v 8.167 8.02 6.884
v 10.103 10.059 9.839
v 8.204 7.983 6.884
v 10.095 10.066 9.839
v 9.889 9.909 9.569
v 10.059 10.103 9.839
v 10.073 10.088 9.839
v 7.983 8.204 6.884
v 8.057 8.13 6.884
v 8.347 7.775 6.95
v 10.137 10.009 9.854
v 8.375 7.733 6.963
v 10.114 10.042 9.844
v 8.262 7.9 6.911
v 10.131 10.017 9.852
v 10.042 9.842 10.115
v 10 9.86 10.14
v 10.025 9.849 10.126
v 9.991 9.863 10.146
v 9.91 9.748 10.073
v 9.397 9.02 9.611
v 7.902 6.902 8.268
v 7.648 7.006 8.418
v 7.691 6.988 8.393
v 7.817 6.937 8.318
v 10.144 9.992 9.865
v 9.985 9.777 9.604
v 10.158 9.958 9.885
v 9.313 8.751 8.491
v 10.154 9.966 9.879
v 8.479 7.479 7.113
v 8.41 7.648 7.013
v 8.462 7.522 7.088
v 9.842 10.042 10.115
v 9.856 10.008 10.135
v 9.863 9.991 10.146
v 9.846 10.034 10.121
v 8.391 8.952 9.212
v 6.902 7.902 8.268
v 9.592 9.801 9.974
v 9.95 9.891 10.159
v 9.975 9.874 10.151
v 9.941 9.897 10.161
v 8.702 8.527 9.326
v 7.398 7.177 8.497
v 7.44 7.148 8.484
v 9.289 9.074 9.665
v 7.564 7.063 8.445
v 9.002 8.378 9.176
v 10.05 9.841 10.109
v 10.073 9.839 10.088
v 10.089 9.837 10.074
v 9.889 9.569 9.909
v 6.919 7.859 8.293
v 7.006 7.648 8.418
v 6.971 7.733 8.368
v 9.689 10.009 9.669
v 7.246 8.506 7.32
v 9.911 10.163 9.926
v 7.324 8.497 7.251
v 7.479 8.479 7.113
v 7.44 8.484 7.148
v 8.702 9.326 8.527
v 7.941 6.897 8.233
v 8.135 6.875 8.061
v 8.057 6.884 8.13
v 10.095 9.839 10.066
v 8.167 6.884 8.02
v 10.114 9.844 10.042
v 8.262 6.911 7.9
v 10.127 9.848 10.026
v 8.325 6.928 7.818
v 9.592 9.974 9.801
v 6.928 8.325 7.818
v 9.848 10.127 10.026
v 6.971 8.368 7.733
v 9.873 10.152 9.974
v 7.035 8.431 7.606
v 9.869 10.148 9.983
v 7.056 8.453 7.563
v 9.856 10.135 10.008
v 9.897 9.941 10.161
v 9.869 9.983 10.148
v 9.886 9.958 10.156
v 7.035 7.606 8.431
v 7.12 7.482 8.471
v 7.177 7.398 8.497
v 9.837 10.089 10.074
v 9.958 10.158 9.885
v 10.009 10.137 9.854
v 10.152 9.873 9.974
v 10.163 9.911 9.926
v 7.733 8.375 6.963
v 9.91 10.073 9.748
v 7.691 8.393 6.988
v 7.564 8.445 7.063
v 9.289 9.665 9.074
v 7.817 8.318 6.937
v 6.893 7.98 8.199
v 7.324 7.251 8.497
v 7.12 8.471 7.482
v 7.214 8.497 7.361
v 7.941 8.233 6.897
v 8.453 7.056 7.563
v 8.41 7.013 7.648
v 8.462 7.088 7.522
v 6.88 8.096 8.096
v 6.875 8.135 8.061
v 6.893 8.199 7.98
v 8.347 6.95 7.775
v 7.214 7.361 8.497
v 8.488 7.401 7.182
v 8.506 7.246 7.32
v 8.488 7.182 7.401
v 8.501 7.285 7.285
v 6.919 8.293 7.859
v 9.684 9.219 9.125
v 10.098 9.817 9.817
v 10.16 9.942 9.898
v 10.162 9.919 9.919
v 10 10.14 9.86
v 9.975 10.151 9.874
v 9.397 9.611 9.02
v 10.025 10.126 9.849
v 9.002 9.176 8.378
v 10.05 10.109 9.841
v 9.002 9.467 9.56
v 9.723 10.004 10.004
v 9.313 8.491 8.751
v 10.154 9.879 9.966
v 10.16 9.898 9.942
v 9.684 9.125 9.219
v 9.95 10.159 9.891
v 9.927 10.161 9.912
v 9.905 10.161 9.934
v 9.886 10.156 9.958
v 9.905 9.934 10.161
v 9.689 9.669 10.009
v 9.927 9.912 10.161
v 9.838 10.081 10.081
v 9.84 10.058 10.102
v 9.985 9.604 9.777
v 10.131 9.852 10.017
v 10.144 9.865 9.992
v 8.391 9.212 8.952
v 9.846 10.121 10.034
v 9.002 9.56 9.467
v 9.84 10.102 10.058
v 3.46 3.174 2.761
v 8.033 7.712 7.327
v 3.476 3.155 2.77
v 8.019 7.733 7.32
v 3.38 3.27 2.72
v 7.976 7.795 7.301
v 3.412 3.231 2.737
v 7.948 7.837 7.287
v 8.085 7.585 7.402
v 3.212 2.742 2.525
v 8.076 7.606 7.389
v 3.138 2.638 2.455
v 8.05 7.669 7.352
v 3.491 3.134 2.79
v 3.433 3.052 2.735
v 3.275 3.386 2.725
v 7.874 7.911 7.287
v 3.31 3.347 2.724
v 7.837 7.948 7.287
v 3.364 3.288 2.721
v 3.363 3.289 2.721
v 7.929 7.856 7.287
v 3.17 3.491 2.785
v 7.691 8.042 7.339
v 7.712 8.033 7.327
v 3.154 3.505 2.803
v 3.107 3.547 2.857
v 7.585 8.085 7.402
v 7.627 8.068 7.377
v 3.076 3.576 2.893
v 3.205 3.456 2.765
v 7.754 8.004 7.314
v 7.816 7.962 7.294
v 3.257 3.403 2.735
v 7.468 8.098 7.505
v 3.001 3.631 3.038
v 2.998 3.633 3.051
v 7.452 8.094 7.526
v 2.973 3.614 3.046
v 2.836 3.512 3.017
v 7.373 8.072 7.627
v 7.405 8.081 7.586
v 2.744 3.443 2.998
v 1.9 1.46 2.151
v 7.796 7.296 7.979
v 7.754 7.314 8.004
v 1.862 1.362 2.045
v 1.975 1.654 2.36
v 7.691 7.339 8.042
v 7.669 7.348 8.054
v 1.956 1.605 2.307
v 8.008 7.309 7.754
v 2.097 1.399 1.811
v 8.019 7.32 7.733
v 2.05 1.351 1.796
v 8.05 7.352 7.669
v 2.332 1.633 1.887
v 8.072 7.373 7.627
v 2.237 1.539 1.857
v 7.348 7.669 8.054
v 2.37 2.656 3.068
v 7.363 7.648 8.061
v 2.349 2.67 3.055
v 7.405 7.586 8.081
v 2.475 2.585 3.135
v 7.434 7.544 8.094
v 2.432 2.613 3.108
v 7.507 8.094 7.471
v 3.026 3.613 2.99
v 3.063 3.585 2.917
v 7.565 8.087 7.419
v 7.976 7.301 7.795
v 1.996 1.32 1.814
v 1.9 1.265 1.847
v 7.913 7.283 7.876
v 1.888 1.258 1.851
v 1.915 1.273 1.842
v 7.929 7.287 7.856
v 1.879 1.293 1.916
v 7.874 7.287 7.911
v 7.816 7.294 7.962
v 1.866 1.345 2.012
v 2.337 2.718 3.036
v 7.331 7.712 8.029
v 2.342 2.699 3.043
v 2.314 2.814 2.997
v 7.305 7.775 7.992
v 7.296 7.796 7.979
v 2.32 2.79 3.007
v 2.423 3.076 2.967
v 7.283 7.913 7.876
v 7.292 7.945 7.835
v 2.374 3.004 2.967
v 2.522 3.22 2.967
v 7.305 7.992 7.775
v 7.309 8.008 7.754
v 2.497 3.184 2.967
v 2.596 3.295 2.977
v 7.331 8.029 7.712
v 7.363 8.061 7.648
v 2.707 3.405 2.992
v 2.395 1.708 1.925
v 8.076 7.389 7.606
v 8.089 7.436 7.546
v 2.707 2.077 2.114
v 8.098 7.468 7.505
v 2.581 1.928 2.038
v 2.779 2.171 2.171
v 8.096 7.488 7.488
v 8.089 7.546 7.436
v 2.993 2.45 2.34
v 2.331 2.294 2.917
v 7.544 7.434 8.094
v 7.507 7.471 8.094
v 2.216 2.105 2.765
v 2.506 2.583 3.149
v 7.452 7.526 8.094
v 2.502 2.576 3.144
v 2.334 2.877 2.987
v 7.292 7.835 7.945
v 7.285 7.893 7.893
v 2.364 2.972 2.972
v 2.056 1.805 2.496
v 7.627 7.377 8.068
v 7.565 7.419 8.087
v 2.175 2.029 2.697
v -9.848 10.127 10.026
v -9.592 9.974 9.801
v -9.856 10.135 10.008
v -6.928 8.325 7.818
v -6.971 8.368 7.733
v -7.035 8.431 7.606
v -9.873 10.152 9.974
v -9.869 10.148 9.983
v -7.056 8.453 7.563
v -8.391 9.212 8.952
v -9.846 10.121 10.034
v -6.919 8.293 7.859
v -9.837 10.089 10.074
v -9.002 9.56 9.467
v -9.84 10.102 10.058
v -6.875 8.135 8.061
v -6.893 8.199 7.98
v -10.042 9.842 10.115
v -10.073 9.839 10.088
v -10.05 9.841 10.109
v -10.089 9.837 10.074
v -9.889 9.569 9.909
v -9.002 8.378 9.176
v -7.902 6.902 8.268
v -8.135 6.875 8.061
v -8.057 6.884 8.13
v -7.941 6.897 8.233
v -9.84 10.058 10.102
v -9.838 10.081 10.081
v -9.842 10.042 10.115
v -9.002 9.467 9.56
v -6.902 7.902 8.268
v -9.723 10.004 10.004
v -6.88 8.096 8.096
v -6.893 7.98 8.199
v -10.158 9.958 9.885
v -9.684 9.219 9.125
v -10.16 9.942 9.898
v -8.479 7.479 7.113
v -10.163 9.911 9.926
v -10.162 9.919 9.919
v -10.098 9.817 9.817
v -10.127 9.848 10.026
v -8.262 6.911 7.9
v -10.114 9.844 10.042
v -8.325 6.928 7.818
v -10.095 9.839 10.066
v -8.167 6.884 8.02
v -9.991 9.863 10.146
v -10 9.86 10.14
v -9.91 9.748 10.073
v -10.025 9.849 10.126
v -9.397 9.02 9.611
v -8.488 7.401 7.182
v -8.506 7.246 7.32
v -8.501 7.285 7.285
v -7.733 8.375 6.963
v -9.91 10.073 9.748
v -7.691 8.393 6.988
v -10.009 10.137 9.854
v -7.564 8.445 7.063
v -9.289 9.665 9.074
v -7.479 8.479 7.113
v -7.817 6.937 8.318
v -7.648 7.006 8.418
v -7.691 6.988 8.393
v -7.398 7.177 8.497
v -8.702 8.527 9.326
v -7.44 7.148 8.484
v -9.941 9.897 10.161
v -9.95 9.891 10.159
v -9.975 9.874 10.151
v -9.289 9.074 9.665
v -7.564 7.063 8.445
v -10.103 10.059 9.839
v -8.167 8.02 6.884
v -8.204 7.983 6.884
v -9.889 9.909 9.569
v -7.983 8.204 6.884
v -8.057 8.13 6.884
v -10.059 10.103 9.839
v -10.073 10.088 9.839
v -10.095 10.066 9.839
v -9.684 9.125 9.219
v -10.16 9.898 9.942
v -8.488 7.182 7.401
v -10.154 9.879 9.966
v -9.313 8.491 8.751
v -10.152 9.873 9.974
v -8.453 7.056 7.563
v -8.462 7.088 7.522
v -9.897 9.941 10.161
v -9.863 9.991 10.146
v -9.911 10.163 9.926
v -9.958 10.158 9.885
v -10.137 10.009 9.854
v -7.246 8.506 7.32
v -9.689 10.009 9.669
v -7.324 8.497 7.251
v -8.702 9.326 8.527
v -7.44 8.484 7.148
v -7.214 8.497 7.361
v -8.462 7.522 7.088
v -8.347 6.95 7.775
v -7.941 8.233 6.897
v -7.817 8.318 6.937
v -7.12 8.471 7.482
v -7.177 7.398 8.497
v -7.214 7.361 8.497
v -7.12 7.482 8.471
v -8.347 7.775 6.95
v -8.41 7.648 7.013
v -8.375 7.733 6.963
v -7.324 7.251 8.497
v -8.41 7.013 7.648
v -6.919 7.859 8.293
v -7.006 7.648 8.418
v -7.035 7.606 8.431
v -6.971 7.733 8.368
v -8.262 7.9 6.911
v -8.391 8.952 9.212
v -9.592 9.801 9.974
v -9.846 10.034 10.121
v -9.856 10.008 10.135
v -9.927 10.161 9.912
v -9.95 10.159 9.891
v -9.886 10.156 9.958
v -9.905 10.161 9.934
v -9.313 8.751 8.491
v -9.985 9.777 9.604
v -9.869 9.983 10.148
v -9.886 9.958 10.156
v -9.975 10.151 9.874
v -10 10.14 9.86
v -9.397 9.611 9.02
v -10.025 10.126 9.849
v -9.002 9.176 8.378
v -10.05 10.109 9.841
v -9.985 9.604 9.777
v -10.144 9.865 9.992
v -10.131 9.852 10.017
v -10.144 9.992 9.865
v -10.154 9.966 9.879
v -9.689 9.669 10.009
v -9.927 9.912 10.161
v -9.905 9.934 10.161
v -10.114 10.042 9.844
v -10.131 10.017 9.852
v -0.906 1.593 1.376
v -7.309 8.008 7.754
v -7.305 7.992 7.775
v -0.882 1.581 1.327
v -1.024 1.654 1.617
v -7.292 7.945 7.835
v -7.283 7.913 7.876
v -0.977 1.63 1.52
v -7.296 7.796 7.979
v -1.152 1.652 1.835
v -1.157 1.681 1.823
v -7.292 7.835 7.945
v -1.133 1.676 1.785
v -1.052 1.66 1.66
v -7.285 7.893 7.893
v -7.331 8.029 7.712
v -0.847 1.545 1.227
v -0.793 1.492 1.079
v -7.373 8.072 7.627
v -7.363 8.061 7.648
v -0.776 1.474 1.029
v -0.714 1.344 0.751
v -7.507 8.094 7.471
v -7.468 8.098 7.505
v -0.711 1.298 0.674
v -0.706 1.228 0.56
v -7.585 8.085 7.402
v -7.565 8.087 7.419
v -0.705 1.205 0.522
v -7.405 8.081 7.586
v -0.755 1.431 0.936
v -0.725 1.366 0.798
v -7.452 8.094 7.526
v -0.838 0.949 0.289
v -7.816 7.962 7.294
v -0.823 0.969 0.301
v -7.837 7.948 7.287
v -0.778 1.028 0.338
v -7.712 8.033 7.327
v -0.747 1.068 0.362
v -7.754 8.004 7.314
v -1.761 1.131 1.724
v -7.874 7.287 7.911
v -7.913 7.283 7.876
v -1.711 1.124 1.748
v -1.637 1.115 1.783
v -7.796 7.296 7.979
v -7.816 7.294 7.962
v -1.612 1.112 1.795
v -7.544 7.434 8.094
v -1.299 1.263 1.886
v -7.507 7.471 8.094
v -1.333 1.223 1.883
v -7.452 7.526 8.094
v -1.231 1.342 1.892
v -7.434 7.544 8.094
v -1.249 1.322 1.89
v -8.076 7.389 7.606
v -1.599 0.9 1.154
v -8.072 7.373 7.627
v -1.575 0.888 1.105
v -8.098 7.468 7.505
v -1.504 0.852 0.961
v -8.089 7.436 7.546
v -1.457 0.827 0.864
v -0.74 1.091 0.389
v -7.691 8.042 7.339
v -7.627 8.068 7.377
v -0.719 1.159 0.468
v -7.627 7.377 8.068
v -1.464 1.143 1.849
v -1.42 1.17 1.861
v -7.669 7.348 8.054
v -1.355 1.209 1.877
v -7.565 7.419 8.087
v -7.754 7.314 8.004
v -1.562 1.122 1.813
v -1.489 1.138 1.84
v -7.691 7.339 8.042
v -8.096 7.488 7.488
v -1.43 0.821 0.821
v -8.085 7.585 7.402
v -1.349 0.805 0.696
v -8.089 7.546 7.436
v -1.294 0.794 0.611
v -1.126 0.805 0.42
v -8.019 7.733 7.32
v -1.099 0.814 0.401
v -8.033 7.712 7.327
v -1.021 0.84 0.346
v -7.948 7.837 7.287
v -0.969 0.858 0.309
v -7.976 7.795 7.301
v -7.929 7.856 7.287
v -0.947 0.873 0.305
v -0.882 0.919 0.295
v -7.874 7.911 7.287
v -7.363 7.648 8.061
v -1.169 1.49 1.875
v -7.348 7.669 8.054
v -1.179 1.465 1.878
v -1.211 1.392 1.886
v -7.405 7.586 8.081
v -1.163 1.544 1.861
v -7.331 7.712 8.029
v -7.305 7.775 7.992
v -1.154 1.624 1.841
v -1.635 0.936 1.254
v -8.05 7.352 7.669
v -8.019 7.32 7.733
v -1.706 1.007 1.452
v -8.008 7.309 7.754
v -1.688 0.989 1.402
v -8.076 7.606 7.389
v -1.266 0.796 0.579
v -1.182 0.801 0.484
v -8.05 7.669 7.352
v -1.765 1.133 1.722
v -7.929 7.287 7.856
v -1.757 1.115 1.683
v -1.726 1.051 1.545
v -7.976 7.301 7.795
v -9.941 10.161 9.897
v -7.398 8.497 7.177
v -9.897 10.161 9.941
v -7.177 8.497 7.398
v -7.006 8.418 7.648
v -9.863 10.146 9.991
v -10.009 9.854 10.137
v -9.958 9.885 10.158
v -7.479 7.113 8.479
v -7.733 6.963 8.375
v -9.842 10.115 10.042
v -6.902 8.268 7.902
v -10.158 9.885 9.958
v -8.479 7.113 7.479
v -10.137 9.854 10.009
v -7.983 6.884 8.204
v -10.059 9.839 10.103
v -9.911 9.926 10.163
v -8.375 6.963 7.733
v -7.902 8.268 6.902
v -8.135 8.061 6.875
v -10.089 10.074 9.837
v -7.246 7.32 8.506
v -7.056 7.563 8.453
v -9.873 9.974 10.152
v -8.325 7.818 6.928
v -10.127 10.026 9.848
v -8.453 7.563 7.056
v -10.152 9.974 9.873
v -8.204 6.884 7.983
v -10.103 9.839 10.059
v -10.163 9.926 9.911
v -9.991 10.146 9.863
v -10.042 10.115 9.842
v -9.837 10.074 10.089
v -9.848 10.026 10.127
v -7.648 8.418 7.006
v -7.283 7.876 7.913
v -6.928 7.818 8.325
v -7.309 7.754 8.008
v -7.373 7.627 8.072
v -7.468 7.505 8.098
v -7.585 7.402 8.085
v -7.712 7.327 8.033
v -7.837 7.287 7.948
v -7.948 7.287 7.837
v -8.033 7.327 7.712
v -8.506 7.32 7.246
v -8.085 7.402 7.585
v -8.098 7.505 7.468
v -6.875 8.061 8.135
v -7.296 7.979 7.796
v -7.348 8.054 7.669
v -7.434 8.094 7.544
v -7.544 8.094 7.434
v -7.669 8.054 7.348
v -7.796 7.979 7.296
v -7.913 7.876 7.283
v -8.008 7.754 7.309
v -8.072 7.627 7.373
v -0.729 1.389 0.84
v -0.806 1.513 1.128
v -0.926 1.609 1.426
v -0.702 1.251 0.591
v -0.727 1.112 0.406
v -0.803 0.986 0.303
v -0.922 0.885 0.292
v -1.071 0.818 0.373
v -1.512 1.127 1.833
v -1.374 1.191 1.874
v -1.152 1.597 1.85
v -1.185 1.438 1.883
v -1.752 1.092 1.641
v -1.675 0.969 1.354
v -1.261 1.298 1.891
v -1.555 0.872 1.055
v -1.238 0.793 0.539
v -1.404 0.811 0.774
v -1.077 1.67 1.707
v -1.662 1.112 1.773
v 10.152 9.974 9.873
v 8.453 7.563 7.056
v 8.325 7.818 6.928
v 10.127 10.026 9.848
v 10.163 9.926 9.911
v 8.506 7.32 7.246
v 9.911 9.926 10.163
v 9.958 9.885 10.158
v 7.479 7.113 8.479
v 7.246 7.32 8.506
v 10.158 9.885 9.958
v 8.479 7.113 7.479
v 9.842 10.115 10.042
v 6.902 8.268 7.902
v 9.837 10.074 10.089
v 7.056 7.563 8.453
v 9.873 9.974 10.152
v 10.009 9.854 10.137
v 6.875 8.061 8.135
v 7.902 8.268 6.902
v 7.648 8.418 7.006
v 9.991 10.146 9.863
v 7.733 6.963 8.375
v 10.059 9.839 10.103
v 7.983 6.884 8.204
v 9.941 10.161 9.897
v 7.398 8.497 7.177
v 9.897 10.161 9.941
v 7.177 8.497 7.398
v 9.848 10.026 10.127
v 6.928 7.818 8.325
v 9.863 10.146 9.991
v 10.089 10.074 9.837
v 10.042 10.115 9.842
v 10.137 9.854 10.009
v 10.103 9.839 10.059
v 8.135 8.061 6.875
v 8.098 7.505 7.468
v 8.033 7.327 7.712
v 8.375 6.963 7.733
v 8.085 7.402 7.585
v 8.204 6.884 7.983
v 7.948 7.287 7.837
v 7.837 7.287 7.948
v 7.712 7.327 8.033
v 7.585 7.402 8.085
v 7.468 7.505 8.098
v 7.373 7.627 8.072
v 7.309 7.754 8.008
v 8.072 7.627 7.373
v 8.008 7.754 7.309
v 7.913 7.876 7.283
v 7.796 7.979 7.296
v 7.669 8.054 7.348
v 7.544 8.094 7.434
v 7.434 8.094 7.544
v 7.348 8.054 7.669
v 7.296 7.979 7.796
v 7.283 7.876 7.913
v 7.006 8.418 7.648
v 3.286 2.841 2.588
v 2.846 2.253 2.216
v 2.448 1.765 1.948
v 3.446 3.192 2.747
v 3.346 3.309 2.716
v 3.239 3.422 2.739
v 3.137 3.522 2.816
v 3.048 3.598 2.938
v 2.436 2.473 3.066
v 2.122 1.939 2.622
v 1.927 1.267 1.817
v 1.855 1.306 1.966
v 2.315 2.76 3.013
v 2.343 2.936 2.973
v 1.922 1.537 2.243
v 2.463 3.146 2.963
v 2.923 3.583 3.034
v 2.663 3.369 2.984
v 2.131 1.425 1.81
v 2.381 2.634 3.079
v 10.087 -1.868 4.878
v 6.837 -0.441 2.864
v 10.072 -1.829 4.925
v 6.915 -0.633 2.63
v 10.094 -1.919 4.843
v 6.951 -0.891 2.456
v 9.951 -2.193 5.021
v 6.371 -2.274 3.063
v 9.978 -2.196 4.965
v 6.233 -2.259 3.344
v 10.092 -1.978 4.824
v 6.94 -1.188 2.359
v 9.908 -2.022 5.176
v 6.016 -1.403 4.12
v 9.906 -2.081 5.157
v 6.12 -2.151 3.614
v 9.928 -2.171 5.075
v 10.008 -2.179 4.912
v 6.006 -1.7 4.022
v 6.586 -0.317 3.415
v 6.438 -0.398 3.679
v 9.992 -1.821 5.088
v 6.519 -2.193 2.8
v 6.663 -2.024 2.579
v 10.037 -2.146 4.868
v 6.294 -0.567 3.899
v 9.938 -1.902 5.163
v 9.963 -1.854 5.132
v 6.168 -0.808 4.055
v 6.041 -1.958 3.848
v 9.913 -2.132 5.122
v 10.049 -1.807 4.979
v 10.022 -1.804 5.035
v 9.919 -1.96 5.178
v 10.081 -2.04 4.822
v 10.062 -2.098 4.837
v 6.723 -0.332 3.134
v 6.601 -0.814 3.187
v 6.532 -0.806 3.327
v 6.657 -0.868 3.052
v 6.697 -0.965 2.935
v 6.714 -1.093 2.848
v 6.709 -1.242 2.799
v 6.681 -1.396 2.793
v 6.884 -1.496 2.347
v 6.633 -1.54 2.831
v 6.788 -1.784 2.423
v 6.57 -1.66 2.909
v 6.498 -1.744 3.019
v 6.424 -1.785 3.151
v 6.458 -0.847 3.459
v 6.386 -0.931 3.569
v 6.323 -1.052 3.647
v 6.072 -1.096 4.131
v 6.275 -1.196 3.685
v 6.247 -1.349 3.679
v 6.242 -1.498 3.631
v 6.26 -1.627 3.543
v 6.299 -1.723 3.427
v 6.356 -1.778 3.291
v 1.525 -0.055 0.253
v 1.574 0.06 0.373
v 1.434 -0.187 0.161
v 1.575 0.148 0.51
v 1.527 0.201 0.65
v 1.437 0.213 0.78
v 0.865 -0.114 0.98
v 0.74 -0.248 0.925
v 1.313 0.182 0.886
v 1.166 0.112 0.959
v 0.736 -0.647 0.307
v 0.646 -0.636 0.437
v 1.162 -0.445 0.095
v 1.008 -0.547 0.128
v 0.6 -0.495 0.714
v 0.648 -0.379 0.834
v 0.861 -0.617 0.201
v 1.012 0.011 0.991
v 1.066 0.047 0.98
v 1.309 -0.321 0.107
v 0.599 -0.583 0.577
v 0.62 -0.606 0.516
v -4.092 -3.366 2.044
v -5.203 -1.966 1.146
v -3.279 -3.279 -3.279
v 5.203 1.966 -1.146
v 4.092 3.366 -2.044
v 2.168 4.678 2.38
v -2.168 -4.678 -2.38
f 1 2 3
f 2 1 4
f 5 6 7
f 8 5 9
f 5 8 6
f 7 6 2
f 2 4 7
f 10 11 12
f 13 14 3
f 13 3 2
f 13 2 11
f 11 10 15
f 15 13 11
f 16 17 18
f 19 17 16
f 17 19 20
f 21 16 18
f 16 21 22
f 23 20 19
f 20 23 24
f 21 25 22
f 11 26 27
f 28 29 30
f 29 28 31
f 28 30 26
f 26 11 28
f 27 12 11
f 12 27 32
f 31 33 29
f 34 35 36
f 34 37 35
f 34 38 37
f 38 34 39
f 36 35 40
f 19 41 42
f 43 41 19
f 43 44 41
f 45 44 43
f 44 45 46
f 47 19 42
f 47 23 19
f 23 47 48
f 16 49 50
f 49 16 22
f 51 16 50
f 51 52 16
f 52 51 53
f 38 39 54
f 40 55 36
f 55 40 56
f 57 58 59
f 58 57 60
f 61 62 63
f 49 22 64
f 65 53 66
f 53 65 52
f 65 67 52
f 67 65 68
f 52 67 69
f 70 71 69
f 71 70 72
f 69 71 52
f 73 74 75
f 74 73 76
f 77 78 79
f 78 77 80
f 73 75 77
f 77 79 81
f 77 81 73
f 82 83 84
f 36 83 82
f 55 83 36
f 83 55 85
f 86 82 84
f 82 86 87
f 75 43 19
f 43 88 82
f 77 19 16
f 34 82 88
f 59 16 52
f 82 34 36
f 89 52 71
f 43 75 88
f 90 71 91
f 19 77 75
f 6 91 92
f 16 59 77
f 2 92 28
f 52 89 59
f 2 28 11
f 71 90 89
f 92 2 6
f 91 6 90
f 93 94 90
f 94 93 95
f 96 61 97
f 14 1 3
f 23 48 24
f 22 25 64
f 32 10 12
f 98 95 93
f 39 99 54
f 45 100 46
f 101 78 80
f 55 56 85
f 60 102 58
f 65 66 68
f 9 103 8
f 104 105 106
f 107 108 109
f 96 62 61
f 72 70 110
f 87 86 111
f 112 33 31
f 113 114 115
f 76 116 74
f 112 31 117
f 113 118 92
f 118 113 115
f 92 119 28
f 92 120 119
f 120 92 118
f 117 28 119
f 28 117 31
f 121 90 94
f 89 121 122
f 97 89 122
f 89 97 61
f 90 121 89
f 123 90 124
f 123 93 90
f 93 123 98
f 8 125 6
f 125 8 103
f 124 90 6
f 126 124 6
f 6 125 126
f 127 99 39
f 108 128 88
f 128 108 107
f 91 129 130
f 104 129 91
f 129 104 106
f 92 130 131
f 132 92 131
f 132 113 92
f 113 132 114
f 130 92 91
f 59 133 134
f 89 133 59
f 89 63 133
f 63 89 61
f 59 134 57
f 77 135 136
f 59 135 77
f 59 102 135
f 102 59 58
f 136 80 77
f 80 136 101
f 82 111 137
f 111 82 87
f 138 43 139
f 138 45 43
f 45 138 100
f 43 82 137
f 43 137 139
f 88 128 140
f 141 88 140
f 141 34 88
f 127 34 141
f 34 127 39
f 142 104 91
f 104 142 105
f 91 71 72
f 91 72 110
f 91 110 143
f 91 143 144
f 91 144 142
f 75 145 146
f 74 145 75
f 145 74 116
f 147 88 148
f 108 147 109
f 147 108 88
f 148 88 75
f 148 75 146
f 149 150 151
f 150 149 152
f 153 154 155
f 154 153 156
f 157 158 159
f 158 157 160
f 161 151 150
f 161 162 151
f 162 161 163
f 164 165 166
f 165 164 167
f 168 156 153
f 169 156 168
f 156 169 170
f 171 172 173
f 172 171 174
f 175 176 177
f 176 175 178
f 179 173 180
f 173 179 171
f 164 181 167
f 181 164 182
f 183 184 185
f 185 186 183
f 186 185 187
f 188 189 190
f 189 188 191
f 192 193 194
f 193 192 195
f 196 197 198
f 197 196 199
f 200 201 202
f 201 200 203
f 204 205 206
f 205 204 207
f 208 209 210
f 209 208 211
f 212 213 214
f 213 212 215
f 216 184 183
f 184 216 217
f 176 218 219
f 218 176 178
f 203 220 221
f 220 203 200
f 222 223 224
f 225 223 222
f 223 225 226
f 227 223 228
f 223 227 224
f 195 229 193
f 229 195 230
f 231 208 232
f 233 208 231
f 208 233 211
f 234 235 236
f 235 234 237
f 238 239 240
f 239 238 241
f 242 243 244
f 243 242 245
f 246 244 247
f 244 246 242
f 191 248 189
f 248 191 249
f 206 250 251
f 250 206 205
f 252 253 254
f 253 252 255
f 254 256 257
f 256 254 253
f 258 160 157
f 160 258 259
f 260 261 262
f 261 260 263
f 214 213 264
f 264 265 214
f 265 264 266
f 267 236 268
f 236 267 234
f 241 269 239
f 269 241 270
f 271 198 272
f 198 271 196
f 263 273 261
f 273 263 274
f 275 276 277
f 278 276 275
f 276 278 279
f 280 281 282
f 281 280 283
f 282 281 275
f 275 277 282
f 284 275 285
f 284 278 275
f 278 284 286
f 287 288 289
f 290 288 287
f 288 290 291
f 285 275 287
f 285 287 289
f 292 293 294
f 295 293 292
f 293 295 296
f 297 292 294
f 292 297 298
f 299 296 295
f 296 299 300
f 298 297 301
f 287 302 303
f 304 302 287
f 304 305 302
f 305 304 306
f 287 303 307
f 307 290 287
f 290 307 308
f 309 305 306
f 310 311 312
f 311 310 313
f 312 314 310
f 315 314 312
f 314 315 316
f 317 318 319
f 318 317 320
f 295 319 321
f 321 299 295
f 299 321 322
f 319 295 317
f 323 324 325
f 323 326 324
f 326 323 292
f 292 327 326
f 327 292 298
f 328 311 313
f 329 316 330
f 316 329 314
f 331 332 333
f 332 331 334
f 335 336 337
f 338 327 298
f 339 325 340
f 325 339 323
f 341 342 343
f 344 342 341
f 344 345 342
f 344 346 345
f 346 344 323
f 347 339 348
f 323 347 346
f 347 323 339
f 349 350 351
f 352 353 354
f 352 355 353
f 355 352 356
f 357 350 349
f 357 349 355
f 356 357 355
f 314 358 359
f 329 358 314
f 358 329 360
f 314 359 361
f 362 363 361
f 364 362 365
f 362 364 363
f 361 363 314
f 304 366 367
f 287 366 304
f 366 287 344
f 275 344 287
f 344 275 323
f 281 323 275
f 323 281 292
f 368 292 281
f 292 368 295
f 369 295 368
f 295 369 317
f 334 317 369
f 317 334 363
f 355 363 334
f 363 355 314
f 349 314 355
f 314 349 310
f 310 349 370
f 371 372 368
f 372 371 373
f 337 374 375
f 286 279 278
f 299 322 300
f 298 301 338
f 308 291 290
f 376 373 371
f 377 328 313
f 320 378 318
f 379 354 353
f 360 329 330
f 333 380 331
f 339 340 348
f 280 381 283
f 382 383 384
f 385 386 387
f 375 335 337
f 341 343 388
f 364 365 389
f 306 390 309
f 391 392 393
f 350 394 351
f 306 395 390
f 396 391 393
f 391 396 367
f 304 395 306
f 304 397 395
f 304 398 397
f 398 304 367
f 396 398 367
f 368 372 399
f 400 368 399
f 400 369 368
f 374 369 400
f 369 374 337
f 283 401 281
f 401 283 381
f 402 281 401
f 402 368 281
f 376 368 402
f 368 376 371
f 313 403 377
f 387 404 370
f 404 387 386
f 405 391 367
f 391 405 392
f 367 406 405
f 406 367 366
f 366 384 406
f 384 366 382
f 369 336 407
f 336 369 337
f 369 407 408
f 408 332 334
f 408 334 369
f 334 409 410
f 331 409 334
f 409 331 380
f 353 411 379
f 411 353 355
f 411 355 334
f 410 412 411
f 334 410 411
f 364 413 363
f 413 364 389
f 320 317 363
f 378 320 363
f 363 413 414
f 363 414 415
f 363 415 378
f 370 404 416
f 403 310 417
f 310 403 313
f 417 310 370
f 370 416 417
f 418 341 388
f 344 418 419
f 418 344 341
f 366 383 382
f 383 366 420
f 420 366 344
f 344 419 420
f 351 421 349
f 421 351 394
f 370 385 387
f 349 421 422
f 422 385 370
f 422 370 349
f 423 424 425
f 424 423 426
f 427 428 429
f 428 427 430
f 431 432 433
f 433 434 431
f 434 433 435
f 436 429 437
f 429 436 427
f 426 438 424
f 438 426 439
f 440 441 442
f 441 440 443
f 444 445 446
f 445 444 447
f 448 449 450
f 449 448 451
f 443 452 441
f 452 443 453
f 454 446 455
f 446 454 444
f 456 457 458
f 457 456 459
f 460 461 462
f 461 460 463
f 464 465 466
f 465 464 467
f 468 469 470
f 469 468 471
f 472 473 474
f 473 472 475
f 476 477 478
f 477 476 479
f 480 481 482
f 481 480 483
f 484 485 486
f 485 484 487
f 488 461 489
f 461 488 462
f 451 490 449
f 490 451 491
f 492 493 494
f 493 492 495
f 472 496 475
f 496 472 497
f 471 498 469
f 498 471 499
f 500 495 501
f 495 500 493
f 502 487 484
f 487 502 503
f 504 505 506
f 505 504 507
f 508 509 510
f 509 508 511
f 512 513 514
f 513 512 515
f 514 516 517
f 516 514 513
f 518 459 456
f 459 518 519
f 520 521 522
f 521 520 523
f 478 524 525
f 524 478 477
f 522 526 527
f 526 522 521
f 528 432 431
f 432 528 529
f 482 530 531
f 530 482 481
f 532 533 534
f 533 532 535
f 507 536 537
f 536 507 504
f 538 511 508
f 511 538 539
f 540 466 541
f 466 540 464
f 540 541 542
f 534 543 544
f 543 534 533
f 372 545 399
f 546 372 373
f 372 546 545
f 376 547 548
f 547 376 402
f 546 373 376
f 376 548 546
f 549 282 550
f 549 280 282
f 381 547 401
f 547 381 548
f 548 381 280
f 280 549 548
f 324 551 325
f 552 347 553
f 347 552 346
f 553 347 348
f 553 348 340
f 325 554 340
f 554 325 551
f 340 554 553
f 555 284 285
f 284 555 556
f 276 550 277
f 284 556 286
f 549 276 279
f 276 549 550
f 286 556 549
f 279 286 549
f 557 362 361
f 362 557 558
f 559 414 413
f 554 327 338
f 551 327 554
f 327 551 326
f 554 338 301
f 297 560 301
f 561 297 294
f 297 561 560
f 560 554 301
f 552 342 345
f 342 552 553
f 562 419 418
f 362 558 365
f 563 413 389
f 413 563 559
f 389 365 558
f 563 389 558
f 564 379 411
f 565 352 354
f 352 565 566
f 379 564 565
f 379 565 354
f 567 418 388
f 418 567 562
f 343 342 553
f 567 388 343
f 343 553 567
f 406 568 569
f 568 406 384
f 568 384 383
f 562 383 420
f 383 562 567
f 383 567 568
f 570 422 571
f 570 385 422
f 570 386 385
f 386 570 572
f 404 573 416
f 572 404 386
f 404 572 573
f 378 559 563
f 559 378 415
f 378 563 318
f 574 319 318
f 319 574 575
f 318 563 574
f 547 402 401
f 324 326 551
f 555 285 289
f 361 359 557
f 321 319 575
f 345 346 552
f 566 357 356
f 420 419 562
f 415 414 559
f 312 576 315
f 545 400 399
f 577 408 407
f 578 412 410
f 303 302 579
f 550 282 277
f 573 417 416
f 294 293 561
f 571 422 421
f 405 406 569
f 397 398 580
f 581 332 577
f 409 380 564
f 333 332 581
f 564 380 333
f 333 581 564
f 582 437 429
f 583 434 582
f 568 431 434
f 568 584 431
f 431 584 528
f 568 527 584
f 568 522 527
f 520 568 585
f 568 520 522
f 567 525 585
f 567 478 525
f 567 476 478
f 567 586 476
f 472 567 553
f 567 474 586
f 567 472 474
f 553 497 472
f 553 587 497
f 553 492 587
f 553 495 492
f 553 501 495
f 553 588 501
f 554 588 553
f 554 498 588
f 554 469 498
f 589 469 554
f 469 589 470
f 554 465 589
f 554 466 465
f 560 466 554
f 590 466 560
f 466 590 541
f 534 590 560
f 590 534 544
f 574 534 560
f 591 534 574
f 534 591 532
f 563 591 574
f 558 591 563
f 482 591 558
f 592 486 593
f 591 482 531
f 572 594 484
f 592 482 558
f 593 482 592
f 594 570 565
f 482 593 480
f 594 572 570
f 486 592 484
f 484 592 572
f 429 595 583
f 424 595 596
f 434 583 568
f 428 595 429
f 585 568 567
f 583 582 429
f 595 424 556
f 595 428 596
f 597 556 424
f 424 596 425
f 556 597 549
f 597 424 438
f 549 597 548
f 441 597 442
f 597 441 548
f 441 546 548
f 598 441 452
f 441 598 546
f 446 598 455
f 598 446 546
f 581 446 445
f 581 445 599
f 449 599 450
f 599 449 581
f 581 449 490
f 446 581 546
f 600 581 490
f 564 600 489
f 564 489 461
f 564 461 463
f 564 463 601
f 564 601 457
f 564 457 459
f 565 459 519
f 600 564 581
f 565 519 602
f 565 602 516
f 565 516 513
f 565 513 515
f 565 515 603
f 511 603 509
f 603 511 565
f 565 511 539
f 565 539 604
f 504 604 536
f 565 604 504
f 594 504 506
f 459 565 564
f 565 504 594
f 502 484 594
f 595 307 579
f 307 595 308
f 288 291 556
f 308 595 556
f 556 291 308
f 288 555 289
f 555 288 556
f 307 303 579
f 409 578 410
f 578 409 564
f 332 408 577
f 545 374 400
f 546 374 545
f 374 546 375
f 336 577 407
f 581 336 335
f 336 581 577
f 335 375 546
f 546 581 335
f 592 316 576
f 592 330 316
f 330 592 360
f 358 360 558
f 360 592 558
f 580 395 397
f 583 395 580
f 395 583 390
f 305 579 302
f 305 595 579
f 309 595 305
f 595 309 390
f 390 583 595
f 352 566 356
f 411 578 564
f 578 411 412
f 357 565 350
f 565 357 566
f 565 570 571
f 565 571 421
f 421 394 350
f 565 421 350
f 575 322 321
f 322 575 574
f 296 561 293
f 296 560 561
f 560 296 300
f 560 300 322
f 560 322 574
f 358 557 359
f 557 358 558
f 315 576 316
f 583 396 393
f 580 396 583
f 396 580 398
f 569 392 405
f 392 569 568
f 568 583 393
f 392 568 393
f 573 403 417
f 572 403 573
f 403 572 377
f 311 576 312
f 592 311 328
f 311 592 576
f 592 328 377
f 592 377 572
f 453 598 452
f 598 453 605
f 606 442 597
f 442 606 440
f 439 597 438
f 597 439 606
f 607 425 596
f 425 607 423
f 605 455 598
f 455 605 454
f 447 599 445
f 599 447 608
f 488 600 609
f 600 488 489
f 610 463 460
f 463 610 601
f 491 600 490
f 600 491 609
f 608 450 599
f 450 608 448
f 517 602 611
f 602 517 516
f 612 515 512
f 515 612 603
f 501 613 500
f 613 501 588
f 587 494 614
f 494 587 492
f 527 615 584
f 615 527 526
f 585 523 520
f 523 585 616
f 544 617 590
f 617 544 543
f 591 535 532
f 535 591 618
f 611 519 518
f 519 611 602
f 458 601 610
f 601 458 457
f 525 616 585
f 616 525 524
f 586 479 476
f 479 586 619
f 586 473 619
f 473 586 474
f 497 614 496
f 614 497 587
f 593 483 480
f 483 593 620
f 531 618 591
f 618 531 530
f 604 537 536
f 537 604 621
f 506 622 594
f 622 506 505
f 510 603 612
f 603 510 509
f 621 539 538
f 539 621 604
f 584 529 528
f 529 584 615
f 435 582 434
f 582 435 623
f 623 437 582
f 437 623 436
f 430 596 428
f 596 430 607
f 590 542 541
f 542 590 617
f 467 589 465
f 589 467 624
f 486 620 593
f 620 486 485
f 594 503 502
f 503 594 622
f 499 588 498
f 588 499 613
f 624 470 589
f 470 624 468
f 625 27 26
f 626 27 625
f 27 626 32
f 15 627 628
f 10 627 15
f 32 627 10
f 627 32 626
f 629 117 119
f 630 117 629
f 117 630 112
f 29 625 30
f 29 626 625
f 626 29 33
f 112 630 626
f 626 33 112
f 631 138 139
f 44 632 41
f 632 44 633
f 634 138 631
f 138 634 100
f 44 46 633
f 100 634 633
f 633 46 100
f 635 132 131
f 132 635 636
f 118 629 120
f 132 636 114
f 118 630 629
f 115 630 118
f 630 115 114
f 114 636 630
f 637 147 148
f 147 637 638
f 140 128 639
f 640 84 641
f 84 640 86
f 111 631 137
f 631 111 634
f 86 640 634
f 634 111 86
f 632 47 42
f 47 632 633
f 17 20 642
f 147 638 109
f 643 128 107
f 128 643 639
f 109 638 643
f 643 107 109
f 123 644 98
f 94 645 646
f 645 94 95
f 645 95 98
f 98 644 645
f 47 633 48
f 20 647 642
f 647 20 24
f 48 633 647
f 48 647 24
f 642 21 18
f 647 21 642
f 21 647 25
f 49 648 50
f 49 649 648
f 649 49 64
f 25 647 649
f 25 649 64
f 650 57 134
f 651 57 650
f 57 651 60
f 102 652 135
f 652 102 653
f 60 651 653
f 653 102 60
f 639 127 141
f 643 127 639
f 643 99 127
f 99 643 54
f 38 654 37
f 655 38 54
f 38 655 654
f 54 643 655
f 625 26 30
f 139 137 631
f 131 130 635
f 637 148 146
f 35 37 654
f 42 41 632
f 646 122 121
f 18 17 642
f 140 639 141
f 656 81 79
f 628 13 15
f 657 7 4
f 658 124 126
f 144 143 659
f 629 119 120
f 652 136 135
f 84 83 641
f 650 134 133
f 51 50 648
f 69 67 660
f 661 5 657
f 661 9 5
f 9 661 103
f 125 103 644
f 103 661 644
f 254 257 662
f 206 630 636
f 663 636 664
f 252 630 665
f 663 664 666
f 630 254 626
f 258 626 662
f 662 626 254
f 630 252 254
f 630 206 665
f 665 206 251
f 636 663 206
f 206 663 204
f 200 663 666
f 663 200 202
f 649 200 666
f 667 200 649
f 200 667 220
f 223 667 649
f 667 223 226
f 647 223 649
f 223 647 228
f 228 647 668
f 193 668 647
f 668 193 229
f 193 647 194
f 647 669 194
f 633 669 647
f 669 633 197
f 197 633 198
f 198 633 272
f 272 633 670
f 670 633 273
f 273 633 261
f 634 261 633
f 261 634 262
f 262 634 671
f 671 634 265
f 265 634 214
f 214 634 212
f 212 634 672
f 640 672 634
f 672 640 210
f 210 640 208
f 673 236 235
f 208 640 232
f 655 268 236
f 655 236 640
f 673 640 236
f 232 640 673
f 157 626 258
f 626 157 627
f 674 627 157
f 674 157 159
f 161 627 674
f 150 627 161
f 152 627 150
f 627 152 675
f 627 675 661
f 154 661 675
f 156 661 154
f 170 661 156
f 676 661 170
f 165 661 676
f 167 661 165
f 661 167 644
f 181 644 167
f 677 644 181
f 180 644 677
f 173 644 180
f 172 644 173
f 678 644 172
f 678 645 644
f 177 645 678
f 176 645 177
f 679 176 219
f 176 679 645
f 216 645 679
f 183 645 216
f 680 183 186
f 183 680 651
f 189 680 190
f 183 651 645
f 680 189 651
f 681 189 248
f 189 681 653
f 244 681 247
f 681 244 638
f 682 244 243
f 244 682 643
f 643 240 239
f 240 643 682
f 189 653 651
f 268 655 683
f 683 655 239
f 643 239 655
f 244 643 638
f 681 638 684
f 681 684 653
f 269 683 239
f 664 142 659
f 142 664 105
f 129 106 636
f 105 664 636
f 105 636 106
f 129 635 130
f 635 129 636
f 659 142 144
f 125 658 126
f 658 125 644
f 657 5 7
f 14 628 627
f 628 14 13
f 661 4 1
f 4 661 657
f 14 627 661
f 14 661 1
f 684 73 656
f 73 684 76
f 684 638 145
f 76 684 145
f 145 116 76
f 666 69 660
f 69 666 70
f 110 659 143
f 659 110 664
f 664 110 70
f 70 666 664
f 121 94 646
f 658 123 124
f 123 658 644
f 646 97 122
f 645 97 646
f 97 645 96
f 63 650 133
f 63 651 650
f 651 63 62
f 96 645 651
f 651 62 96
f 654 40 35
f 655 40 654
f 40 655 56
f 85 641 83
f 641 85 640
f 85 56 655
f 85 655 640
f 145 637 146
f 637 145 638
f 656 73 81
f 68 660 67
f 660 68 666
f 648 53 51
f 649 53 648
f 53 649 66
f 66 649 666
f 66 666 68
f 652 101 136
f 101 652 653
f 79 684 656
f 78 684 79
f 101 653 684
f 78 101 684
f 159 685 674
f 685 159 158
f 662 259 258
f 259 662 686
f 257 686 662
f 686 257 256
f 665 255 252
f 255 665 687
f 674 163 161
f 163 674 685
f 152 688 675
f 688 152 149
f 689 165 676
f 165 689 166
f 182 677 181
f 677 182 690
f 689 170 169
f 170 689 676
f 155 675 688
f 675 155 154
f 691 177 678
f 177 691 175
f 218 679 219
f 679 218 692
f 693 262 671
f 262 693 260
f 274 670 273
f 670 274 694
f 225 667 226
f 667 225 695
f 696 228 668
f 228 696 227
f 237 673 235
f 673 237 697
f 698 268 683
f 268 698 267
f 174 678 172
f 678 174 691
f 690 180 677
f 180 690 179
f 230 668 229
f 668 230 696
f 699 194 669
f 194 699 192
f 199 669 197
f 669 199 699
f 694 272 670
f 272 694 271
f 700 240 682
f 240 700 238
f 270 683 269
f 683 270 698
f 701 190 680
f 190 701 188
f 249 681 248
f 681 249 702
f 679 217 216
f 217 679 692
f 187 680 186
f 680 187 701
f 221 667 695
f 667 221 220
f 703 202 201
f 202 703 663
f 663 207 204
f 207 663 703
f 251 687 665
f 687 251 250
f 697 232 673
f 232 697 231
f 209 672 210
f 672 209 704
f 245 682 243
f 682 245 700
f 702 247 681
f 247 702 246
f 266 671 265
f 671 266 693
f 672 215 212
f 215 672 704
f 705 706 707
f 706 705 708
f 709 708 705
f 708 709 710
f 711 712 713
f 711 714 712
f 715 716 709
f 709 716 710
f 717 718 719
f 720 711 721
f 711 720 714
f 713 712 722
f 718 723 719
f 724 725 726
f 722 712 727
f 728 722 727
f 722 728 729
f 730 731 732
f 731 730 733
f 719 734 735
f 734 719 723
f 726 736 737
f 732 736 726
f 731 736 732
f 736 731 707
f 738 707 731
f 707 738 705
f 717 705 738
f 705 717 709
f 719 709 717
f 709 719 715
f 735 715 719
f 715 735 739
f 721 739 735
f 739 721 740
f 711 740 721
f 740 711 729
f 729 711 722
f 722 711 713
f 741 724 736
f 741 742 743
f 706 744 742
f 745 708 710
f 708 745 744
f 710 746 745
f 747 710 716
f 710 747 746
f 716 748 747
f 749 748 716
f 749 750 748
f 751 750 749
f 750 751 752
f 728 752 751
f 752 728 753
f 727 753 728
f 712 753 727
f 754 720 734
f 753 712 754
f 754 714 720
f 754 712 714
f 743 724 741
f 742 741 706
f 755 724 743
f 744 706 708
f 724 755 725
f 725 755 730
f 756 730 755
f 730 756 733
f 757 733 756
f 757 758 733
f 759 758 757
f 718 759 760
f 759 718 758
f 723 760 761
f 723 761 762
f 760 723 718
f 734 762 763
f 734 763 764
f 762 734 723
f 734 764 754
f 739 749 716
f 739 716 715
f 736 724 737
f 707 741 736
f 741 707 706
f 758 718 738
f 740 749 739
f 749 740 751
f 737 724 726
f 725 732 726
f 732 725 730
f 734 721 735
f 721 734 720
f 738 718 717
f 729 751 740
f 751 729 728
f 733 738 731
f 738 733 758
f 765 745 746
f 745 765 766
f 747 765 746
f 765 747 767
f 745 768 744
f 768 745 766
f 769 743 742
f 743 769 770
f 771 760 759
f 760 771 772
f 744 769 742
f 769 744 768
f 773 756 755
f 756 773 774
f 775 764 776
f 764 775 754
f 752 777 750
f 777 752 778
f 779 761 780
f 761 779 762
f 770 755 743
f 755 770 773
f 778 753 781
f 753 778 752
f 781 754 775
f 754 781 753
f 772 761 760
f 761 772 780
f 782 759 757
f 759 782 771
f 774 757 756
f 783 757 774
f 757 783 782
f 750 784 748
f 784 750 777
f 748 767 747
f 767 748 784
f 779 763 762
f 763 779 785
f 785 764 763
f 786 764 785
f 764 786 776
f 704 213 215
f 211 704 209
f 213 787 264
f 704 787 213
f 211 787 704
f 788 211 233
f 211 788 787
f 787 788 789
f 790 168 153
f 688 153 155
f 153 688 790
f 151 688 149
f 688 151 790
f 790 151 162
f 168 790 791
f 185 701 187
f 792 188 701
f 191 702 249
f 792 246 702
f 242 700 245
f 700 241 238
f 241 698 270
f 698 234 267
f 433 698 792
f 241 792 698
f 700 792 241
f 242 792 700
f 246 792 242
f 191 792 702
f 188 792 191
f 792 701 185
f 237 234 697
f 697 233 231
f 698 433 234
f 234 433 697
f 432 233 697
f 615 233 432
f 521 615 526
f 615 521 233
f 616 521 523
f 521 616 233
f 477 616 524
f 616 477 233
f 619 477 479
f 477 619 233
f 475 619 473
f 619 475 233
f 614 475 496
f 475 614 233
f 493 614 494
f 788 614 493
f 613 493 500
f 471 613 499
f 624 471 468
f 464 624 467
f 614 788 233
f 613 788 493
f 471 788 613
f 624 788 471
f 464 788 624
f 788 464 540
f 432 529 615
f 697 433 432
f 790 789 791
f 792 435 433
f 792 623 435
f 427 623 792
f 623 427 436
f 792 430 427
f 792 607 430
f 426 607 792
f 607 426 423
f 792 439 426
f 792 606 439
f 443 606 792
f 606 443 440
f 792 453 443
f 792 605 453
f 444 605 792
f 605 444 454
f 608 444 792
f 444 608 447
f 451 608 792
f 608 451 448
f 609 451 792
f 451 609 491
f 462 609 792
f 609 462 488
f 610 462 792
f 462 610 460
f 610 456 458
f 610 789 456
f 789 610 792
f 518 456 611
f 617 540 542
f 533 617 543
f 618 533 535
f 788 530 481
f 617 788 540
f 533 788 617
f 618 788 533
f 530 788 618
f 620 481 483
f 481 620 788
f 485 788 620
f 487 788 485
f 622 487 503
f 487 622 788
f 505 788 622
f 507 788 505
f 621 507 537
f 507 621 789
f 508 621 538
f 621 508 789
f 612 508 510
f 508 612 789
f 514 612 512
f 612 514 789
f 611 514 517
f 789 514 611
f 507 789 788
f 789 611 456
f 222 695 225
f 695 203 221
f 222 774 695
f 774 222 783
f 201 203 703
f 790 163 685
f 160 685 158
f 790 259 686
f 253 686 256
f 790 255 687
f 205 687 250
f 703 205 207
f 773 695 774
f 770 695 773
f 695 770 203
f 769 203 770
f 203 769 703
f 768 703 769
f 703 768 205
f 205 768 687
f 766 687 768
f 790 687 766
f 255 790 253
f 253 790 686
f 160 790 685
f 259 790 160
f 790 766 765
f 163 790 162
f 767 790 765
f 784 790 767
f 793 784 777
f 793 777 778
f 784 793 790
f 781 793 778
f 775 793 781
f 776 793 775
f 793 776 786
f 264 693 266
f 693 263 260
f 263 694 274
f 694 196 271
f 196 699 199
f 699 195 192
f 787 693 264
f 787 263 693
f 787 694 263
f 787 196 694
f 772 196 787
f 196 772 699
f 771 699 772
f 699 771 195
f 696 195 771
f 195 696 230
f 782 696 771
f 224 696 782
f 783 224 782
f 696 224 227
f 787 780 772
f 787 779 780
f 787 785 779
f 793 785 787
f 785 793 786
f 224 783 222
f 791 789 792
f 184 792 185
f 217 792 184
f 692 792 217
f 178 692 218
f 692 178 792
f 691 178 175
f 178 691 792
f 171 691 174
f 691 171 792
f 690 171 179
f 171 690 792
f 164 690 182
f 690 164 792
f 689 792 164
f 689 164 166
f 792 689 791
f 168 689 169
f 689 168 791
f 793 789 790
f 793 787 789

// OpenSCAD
//---------------------------------------------------------------
//-- Openscad vector library
//-- This is a component of the obiscad opescad tools by Obijuan
//-- (C) Juan Gonzalez-Gomez (Obijuan)
//-- Sep-2012
//---------------------------------------------------------------
//-- Released under the GPL license
//---------------------------------------------------------------

//-- Updated orientate function to correct singularity when v lies along vref

//----------------------------------------
//-- FUNCTIONS FOR WORKING WITH VECTORS
//----------------------------------------

//-- Calculate the module of a vector
function mod(v) = (sqrt(v[0]*v[0]+v[1]*v[1]+v[2]*v[2]));

//-- Calculate the cros product of two vectors
function cross(u,v) = [
  u[1]*v[2] - v[1]*u[2],
  -(u[0]*v[2] - v[0]*u[2]) ,
  u[0]*v[1] - v[0]*u[1]];

//-- Calculate the dot product of two vectors
function dot(u,v) = u[0]*v[0]+u[1]*v[1]+u[2]*v[2];

//-- Return the unit vector of a vector
function unitv(v) = v/mod(v);

//-- Return the angle between two vectores
function anglev(u,v) = acos( dot(u,v) / (mod(u)*mod(v)) );

//----------------------------------------------------------
//--  Draw a point in the position given by the vector p  
//----------------------------------------------------------
module point(p)
{
  translate(p)
    sphere(r=0.7,$fn=20);
}

//------------------------------------------------------------------
//-- Draw a vector poiting to the z axis
//-- This is an auxiliary module for implementing the vector module
//--
//-- Parameters:
//--  l: total vector length (line + arrow)
//--  l_arrow: Vector arrow length
//--  mark: If true, a mark is draw in the vector head, for having
//--    a visual reference of the rolling angle
//------------------------------------------------------------------
module vectorz(l=10, l_arrow=4, mark=false)
{
  //-- vector body length (not including the arrow)
  lb = l - l_arrow;

  //-- The vector is locatead at 0,0,0
  translate([0,0,lb/2])
  union() {

    //-- Draw the arrow
    translate([0,0,lb/2])
      cylinder(r1=2/2, r2=0.2, h=l_arrow, $fn=20);

    //-- Draw the mark
    if (mark) {
      translate([0,0,lb/2+l_arrow/2])
      translate([1,0,0])
        cube([2,0.3,l_arrow*0.8],center=true);
    }

    //-- Draw the body
    cylinder(r=1/2, h=lb, center=true, $fn=20);
  }

  //-- Draw a sphere in the vector base
  sphere(r=1/2, $fn=20);
}

//-----------------------------------------------------------------
//-- ORIENTATE OPERATOR
//--
//--  Orientate an object to the direction given by the vector v
//--  Parameters:
//--    v : Target orientation
//--    vref: Vector reference. It is the vector of the local frame
//--          of the object that want to be poiting in the direction
//--          of v
//--    roll: Rotation of the object around the v axis
//-------------------------------------------------------------------
module orientate(v,vref=[0,0,1], roll=0)
{
  //-- Calculate the rotation axis
  raxis = v[0]==vref[0] && v[1]==vref[1] ? [0,1,0] : cross(vref,v);
  
  //-- Calculate the angle between the vectors
  ang = anglev(vref,v);

  //-- Rotate the child!
  rotate(a=roll, v=v)
    rotate(a=ang, v=raxis)
      children(0);
}

module orientate2(v,vref=[0,0,1], roll=0)
{
  //-- Calculate the rotation axis
  raxis = cross(vref,v);
  
  //-- Calculate the angle between the vectors
  ang = anglev(vref,v);

  //-- Rotate the child!
  rotate(a=roll, v=v)
    rotate(a=ang, v=raxis)
      children(0);
}

//---------------------------------------------------------------------------
//-- Draw a vector 
//--
//-- There are two modes of drawing the vector
//-- * Mode 1: Given by a cartesian point(x,y,z). A vector from the origin
//--           to the end (x,y,z) is drawn. The l parameter (length) must 
//--           be 0  (l=0)
//-- * Mode 2: Give by direction and length
//--           A vector of length l pointing to the direction given by
//--           v is drawn
//---------------------------------------------------------------------------
//-- Parameters:
//--  v: Vector cartesian coordinates
//--  l: total vector length (line + arrow)
//--  l_arrow: Vector arrow length
//    mark: If true, a mark is draw in the vector head, for having
//--    a visual reference of the rolling angle
//---------------------------------------------------------------------------
module vector(v,l=0, l_arrow=4, mark=false)
{
  //-- Get the vector length from the coordinates
  mod = mod(v);

  //-- The vector is very easy implemented by means of the orientate
  //-- operator:
  //--  orientate(v) vectorz(l=mod, l_arrow=l_arrow)
  //--  BUT... in OPENSCAD 2012.02.22 the recursion does not
  //--    not work, so that if the user use the orientate operator
  //--    on a vector, openscad will ignore it..
  //-- The solution at the moment (I hope the openscad developers
  //--  implement the recursion in the near future...)
  //--  is to repite the orientate operation in this module

  //---- SAME CALCULATIONS THAN THE ORIENTATE OPERATOR!
  //-- Calculate the rotation axis

  vref = [0,0,1];
  raxis = cross(vref,v);
  
  //-- Calculate the angle between the vectors
  ang = anglev(vref,v);

  //-- orientate the vector
  //-- Draw the vector. The vector length is given either
  //--- by the mod variable (when l=0) or by l (when l!=0)
  if (l==0)
    rotate(a=ang, v=raxis)
      vectorz(l=mod, l_arrow=l_arrow, mark=mark);
  else
    rotate(a=ang, v=raxis)
      vectorz(l=l, l_arrow=l_arrow, mark=mark);

}

//----------------------------------------------------
//-- Draw a Frame of reference
//-- Parameters:
//-- l: length of the Unit vectors
//-----------------------------------------------------
module frame(l=10, l_arrow=4)
{

  //-- Z unit vector
  color("Blue")
    vector([0,0,l], l_arrow=l_arrow);

  //-- X unit vector
  color("Red")
    vector([l,0,0], l_arrow=l_arrow );

  //-- Y unit vector
  color("Green")
    vector([0,l,0],l_arrow=l_arrow);

  //-- Origin
  color("Gray")
    sphere(r=1, $fn=20);
}

//--------------------------------------------------
//-- Modules for testings and examples
//-- Testing that the vector library is working ok
//--------------------------------------------------

//-- 22 vectors in total are drawn, poiting to different directions
module Test_vectors1()
{

  a = 20;
  k = 1;

  //--  Add a frame of reference (in the origin)
  frame(l=a);

  //-- Negative vectors, pointing towards the three axis: -x, -y, -z
  color("Red")   vector([-a, 0,  0]);
  color("Green") vector([0, -a,  0]);
  color("Blue")  vector([0,  0, -a]);

  //-- It is *not* has been implemented using a for loop on purpose
  //-- This way, individual vectors can be commented out or highlighted

  //-- vectors with positive z
  vector([a,   a, a*k]);
  vector([0,   a, a*k]);
  vector([-a,  a, a*k]);
  vector([-a,  0, a*k]);

  vector([-a, -a, a*k]);
  vector([0,  -a, a*k]);
  vector([a,  -a, a*k]);
  vector([a,   0, a*k]);


  //-- Vectors with negative z
  vector([a,   a, -a*k]);
  vector([0,   a, -a*k]);
  vector([-a,  a, -a*k]);
  vector([-a,  0, -a*k]);

  vector([-a, -a, -a*k]);
  vector([0,  -a, -a*k]);
  vector([a,  -a, -a*k]);
  vector([a,   0, -a*k]);
}

//--- Another test...
module Test_vectors2()
{

  //-- Add the vector into the vector table
  //-- This vectors are taken as directions
  //-- All the vectors will be drawn with the same length (l)
  vector_table = [
    [1,   1, 1],
    [0,   1, 1],
    [-1,  1, 1],
    [-1,  0, 1],
    [-1, -1, 1],
    [0,  -1, 1],
    [1,  -1, 1],
    [1,   0, 1],
  
    [1,   1, -1],
    [0,   1, -1],
    [-1,  1, -1],
    [-1,  0, -1],
    [-1, -1, -1],
    [0,  -1, -1],
    [1,  -1, -1],
    [1,   0, -1],
  ];

  //-- Vector length
  l=20;

  frame(l=10);

  //-- Draw all the vector given in the table
  //-- The vectors point to the direction given in the table
  //-- They all are drawn with a length equal to l
  for (v=vector_table) {
    //-- Vector given by direction and length
    vector(v,l=l);
  }
}


//-- Test the cross product and the angle
//-- between vectors
module Test_vector3()
{
  //-- Start with 2 unit vectors
  v=unitv([1,1,1]);
  u=unitv([0,1,0]);

  //-- Draw the vector in different colors
  //-- Increase the length for drawing
  color("Red") vector(v*20);
  color("blue") vector(u*20);

  //-- Get the cross product
  w = cross(v,u);
  vector(w*20);

  //-- The cross product is NOT conmutative... 
  //-- change the order of v and u
  w2 = cross(u,v);
  vector(w2*20);

  //-- w should be perpendicular to v and u
  //-- Calculate the angles between them:
  echo("U , V: ", anglev(u,v));
  echo("W , U: ", anglev(w,u));
  echo("W , V: ", anglev(w,v));

}

//-- Test the orientate operator
module Test_vector4()
{
  o = [10,10,10];
  v = [-10,10,10];

  color("Red") vector(o);
  color("Blue") vector(v);

  //-- Orientate the vector o in the direction of v
  orientate(v,o)
    vector(o);

  //-- Inverse operation: orientate the v vector in the direction
  //-- of o
  orientate(o,v)
    vector(v);

  //-- Example of orientation of a cube
  orientate(o,vref=[10,-2,5],roll=0)
    cube([10,2,5],center=true);

  vector([10,-2,5]);

}

//-------- Perform tests......

Test_vector4();


/*

Test_vectors1();


translate([60,0,0]) 
  Test_vectors2();
*/
